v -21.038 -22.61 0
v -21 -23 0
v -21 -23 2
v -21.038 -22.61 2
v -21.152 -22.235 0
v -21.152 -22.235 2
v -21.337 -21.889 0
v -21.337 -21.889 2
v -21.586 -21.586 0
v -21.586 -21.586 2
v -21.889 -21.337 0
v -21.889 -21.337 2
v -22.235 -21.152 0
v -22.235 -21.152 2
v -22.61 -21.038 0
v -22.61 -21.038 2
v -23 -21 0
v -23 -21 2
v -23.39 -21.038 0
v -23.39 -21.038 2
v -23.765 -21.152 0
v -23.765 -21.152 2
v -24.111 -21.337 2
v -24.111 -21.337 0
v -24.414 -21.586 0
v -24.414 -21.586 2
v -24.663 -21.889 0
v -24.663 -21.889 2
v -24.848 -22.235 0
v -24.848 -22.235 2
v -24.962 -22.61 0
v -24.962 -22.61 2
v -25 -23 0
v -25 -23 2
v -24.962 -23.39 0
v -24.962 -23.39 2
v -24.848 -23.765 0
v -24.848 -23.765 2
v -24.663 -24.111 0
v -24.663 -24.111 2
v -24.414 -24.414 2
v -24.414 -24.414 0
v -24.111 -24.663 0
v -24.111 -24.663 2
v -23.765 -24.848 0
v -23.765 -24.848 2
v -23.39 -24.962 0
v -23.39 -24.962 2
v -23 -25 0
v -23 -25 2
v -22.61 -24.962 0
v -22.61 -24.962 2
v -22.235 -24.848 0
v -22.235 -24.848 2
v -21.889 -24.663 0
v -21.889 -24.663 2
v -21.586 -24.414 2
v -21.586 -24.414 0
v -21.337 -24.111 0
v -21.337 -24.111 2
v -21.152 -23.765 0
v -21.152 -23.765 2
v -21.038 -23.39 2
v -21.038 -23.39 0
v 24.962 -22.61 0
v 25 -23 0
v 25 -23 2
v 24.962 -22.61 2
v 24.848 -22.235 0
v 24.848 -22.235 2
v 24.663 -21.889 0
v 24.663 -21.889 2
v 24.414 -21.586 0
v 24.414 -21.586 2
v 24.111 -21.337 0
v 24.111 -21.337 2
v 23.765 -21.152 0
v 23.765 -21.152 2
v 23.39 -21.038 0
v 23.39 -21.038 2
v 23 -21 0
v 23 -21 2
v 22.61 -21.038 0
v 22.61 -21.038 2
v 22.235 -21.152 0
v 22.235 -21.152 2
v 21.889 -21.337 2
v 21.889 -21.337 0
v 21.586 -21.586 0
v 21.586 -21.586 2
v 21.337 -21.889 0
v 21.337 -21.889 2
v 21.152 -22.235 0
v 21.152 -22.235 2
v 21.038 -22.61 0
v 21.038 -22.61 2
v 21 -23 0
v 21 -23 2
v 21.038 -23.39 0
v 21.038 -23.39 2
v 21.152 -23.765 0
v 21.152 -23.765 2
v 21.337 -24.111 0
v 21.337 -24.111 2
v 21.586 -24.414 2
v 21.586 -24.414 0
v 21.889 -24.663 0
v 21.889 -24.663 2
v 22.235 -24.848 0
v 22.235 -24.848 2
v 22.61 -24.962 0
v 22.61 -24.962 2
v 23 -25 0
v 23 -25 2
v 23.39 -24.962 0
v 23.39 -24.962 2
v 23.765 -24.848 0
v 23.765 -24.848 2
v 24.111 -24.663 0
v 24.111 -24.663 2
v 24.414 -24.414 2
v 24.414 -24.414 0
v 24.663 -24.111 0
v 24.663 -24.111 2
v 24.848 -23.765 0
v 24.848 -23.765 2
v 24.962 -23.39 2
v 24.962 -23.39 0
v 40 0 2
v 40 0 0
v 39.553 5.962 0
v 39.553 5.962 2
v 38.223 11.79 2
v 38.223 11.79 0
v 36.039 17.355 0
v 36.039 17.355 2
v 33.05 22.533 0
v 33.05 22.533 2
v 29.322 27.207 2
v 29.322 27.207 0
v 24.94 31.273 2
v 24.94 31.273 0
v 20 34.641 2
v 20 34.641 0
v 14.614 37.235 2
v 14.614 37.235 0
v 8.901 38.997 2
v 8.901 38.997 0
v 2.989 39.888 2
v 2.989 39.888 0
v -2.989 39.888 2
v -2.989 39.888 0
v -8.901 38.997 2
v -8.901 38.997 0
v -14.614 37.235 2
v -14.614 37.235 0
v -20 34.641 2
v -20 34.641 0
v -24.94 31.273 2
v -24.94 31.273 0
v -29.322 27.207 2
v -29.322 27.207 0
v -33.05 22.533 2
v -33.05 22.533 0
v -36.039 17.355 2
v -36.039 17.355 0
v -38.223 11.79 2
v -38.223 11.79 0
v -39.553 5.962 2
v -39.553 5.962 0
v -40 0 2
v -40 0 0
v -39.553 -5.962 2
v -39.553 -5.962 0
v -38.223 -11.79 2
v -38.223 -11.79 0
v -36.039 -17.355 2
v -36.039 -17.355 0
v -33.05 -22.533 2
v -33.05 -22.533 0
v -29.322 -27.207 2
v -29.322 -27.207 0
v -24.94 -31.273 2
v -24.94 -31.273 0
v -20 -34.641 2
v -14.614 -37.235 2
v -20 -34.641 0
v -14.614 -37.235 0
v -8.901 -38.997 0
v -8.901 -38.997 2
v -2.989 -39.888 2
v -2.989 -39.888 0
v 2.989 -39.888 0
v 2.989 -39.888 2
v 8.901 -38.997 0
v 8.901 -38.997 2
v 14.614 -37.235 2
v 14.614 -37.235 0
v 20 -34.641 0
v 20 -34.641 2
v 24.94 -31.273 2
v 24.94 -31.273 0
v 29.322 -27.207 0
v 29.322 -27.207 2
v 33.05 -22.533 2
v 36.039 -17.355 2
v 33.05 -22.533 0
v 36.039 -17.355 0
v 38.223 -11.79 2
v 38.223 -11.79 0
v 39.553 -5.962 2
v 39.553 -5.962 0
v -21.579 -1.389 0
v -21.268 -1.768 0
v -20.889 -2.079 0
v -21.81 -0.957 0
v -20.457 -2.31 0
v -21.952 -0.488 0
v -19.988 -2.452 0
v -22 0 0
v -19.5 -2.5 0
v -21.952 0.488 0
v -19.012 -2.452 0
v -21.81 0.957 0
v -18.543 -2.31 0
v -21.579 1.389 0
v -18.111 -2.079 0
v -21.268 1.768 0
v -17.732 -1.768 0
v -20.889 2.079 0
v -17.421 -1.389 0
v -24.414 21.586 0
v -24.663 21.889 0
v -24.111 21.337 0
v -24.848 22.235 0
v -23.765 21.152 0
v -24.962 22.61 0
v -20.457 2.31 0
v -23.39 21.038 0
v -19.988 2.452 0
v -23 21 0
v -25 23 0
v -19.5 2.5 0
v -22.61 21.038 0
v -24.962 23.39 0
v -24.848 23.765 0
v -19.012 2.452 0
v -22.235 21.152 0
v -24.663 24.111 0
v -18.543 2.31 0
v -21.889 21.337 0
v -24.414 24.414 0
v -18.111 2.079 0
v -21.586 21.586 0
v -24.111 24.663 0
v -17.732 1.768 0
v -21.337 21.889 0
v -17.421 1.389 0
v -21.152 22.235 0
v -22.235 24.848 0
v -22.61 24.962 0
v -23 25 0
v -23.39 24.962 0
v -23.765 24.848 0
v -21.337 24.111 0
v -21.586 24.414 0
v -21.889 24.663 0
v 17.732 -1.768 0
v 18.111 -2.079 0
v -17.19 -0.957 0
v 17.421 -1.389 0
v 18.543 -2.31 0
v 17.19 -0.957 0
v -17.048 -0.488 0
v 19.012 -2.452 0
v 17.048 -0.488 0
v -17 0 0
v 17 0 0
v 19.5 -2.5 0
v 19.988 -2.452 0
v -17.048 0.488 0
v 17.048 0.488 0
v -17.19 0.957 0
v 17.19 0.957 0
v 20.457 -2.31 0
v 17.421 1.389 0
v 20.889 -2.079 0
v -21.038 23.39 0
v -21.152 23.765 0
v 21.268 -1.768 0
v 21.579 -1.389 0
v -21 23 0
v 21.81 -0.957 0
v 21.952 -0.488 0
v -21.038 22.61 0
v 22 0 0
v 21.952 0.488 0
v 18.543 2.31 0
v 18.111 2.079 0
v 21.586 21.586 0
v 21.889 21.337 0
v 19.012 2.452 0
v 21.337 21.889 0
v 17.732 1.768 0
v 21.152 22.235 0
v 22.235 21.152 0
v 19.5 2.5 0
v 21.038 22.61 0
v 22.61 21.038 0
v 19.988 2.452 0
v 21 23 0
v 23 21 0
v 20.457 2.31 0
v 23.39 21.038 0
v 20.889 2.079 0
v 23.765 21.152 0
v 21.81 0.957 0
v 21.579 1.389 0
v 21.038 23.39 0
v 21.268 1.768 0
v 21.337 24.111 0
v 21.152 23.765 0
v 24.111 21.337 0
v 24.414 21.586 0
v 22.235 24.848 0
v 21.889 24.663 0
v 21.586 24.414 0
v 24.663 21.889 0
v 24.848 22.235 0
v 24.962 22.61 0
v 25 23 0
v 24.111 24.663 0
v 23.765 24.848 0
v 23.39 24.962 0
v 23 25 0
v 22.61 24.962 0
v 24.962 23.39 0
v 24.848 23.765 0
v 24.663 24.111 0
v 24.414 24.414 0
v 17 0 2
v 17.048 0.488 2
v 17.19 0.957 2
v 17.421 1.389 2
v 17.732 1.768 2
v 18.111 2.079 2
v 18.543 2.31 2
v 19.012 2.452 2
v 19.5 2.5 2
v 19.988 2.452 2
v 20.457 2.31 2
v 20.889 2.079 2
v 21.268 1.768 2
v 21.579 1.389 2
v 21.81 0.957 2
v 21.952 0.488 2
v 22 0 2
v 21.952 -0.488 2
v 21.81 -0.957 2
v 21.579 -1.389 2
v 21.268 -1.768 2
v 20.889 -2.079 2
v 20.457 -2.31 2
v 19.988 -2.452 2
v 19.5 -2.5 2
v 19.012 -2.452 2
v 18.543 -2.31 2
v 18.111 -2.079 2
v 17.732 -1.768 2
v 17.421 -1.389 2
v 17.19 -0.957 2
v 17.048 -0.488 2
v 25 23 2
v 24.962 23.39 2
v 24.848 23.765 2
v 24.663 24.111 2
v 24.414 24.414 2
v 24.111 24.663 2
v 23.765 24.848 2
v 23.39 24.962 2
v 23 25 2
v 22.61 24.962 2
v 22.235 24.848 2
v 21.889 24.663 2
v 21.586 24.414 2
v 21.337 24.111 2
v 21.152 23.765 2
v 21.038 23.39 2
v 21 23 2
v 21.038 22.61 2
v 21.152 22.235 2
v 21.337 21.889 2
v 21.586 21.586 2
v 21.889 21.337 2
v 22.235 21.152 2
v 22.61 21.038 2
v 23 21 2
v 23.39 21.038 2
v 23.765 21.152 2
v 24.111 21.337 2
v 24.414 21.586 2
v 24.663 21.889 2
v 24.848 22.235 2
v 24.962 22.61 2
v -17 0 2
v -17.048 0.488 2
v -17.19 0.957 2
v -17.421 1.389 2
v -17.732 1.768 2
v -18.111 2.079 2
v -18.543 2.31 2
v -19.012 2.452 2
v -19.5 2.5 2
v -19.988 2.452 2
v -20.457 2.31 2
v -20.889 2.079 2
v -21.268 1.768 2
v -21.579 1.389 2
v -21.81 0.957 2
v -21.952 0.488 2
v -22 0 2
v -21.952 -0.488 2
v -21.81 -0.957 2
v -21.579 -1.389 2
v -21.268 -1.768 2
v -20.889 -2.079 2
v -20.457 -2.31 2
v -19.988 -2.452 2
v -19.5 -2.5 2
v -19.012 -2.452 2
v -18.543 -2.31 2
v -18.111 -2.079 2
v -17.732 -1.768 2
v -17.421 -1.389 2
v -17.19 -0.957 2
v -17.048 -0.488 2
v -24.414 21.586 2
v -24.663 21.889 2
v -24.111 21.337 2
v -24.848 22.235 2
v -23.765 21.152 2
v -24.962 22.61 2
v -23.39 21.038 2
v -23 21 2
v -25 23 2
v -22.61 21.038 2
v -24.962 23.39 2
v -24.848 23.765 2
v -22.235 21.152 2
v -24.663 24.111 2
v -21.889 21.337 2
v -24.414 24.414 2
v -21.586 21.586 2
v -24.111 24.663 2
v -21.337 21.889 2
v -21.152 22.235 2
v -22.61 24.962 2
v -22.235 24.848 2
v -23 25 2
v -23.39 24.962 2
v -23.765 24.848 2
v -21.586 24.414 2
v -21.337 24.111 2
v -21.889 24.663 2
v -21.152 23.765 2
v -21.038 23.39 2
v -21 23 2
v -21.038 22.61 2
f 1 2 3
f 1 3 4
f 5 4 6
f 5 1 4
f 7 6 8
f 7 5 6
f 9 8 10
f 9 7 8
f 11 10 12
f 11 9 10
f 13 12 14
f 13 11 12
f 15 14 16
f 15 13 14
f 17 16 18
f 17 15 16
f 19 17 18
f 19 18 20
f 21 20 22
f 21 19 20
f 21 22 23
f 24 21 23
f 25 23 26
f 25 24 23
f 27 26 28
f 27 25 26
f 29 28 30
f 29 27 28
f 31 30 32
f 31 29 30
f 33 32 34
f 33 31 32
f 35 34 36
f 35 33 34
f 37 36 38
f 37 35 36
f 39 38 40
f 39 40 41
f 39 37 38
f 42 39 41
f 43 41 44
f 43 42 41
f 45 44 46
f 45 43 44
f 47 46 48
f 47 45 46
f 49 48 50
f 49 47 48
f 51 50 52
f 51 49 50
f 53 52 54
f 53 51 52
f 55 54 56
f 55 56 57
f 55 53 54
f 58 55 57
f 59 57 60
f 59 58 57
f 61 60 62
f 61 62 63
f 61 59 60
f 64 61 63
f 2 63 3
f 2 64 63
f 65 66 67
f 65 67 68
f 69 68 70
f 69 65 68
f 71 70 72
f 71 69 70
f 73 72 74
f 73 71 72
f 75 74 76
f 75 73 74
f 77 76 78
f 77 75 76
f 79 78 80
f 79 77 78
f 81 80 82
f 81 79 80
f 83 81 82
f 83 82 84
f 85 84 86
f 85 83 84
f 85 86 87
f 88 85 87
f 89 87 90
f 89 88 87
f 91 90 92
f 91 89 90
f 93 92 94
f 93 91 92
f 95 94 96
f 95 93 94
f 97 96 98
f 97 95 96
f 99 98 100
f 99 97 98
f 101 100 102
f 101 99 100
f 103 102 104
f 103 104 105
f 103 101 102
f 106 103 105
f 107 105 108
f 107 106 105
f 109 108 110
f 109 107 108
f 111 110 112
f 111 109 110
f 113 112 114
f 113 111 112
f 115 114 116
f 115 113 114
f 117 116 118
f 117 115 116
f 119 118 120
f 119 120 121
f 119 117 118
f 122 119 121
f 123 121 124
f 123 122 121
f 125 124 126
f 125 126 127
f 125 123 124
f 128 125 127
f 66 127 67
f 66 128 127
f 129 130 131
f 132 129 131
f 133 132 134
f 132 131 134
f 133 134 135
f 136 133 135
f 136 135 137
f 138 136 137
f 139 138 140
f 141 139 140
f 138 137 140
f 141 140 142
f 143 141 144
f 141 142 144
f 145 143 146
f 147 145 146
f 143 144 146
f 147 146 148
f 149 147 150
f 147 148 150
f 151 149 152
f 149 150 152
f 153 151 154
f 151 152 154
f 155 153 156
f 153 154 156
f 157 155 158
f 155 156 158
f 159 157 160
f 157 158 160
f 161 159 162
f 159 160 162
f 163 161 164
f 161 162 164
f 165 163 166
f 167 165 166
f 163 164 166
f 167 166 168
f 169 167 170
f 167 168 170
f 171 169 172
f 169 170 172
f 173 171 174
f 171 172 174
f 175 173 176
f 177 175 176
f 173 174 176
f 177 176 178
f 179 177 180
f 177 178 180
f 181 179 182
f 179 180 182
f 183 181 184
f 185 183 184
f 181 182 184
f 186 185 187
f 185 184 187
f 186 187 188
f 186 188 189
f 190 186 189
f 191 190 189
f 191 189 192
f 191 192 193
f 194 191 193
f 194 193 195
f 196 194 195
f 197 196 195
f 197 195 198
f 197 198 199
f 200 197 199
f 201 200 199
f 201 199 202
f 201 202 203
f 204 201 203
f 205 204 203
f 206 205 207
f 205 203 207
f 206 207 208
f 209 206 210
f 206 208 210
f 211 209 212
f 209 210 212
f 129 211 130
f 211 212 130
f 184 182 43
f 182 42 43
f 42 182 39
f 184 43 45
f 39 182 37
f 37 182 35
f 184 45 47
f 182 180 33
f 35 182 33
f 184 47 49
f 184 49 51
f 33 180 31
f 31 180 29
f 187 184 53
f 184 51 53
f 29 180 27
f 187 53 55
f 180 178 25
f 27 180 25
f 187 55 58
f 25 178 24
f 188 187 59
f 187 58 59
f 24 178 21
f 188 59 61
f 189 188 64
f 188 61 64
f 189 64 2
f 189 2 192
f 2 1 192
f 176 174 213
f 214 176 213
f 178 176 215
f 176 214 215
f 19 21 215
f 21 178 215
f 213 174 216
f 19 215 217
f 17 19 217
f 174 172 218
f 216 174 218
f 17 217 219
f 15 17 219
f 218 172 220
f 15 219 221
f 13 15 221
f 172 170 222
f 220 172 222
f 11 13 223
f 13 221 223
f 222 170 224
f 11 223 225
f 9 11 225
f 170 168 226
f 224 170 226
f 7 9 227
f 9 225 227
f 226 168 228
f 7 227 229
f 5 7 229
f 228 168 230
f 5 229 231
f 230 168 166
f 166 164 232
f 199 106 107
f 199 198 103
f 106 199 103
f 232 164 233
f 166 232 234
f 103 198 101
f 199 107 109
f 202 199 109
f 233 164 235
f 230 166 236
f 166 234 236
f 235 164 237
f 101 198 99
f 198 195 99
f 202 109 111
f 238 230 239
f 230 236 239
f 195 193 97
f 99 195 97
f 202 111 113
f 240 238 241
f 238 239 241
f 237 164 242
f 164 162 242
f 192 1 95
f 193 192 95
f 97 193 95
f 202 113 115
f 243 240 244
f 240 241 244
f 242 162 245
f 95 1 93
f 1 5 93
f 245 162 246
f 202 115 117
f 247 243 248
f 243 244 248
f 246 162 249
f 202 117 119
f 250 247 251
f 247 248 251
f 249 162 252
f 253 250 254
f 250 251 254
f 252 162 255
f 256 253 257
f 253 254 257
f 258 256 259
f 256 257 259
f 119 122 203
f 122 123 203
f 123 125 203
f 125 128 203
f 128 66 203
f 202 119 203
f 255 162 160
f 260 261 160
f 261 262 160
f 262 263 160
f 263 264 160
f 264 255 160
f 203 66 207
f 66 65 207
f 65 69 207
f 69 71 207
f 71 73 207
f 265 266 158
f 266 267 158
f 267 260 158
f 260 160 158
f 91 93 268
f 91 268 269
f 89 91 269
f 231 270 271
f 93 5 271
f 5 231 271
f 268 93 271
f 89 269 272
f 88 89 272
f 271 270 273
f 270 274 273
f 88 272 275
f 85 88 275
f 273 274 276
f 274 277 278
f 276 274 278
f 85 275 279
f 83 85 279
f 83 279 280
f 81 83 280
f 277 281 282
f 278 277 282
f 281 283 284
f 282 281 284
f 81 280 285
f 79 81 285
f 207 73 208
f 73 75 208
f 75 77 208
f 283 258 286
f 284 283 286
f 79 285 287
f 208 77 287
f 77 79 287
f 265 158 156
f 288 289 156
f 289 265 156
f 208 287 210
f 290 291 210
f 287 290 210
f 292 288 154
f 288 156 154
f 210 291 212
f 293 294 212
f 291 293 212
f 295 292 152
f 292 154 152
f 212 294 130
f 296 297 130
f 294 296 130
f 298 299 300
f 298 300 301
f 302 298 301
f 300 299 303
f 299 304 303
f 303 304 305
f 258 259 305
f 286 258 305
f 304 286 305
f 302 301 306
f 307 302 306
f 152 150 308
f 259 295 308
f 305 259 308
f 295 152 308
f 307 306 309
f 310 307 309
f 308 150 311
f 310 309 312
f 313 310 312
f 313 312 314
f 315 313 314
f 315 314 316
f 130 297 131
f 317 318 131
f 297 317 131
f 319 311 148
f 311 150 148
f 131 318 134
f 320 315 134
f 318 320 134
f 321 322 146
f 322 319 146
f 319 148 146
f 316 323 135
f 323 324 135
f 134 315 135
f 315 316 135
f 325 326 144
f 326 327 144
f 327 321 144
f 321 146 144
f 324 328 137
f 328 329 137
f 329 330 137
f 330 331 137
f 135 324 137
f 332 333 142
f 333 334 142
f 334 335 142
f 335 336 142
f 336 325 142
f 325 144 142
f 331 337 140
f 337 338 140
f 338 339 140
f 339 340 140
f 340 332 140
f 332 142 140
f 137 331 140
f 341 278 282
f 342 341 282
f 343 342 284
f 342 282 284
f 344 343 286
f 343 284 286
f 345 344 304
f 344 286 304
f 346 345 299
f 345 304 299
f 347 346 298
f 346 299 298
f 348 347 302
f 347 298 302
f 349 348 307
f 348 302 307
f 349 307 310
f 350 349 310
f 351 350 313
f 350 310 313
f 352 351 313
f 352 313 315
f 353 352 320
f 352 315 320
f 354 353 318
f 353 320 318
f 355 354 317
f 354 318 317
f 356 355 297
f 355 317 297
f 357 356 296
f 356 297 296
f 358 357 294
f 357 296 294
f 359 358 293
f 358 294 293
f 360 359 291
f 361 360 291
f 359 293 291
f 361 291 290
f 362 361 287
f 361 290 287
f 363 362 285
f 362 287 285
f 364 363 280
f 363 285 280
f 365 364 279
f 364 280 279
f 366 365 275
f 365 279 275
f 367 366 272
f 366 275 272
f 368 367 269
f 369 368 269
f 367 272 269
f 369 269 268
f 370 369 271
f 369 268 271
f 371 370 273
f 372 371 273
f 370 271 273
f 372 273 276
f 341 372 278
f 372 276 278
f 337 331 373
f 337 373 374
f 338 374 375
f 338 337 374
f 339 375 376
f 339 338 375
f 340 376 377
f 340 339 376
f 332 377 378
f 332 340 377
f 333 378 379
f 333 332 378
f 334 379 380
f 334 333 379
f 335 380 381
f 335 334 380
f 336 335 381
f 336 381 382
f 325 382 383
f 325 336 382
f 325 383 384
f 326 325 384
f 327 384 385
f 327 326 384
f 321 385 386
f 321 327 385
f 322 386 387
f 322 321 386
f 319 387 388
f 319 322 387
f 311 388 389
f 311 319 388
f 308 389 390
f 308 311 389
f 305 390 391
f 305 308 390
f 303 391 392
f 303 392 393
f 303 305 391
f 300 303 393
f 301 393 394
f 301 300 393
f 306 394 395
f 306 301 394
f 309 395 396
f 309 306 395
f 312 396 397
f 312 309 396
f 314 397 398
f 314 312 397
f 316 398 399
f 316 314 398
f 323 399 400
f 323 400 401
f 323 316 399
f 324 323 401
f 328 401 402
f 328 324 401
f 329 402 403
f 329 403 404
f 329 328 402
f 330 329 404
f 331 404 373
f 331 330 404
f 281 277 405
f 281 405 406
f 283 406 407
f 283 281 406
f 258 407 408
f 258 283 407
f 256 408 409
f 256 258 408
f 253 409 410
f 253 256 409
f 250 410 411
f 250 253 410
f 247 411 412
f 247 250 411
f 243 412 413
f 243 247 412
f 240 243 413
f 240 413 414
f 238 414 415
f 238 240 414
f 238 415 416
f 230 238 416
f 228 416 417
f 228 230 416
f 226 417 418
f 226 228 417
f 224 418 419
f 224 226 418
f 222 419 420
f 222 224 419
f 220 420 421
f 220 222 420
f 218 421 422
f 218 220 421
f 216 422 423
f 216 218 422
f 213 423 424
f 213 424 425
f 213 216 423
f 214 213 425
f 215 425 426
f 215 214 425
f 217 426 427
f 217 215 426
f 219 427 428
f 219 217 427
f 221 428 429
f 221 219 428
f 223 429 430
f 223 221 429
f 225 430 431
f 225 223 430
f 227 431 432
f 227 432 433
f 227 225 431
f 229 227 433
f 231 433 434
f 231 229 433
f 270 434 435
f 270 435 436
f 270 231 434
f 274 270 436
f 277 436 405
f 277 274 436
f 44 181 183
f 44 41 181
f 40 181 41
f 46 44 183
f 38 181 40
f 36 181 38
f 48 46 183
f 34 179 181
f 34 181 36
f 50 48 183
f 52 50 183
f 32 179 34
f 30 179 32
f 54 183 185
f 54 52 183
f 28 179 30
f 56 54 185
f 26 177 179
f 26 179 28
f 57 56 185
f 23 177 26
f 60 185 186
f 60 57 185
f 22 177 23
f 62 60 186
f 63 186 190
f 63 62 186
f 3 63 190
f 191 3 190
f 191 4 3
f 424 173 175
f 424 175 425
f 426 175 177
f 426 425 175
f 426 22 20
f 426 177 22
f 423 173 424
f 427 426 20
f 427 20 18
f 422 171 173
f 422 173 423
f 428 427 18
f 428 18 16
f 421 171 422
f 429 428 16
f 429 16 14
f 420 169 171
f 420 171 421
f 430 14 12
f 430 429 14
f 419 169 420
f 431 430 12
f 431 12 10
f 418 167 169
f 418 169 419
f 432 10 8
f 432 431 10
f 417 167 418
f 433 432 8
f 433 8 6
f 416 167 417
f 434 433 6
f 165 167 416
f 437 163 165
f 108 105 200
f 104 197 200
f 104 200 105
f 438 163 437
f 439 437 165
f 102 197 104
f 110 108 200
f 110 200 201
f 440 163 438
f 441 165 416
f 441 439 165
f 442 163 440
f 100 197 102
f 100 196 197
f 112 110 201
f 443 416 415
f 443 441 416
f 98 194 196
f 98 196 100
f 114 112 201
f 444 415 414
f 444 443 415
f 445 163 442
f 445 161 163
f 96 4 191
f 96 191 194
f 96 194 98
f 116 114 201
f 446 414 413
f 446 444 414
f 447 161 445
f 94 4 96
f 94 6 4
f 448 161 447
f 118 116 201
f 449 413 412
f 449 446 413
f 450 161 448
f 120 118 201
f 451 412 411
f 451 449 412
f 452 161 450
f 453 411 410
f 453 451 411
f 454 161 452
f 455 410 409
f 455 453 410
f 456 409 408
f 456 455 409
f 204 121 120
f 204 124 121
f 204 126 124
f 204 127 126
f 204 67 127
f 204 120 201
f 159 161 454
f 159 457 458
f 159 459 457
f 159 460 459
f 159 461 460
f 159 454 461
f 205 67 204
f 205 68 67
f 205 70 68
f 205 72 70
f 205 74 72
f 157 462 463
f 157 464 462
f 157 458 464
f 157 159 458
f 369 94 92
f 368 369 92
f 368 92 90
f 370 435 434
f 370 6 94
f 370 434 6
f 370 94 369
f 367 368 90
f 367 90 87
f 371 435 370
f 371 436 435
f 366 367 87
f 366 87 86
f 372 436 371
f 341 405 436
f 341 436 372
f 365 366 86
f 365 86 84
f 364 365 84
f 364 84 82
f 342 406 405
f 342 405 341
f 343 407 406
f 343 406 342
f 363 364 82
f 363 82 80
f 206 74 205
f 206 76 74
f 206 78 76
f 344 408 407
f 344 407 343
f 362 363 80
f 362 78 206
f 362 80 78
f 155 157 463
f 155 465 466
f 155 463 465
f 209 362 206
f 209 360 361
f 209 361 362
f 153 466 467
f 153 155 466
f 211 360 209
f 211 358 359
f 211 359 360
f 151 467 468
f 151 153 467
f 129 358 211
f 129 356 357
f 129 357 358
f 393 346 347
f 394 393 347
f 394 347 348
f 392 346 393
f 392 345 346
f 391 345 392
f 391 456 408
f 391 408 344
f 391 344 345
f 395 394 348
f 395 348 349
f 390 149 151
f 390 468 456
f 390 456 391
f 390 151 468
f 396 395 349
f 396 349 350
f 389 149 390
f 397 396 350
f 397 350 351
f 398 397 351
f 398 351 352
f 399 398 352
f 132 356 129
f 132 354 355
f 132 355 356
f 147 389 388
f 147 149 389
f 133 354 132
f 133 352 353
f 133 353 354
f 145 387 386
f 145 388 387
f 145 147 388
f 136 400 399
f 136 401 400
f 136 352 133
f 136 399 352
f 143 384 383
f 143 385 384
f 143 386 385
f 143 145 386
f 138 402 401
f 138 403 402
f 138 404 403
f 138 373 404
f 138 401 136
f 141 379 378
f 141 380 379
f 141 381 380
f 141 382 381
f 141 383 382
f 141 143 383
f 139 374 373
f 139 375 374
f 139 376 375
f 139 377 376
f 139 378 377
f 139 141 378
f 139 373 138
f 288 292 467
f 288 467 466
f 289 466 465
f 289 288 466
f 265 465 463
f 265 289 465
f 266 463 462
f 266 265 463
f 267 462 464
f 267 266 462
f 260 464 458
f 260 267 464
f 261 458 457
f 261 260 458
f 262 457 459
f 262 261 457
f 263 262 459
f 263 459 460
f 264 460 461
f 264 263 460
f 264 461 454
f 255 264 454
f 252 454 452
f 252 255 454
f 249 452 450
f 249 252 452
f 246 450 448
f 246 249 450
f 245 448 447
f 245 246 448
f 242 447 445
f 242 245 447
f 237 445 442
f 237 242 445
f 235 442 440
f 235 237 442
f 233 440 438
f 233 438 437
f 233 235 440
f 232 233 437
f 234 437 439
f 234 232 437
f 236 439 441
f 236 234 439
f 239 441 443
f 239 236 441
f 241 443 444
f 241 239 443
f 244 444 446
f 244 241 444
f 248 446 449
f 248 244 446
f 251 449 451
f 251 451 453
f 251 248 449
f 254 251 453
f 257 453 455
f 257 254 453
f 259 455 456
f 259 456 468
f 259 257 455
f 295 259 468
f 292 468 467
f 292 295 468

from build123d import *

# Parameters (mm, degrees)
F0_R     = 40
F0_R_2   = 2
F0_R_3   = 2.5
F1_DEPTH = 2


with BuildPart() as f1:
    # F0 (on Top) → F1 (new body)
    with BuildSketch(Plane.XY):
        Circle(F0_R)
        with Locations((-23, -23)):
            Circle(F0_R_2, mode=Mode.SUBTRACT)
        with Locations((23, -23)):
            Circle(F0_R_2, mode=Mode.SUBTRACT)
        with Locations((-19.5, 0)):
            Circle(F0_R_3, mode=Mode.SUBTRACT)
        with Locations((-23, 23)):
            Circle(F0_R_2, mode=Mode.SUBTRACT)
        with BuildLine():
            ThreePointArc((22, 0), (19.5, -2.5), (17, 0))
            ThreePointArc((17, 0), (19.5, 2.5), (22, 0))
        make_face(mode=Mode.SUBTRACT)
        with Locations((23, 23)):
            Circle(F0_R_2, mode=Mode.SUBTRACT)
    extrude(amount=F1_DEPTH)


solid = f1.part
